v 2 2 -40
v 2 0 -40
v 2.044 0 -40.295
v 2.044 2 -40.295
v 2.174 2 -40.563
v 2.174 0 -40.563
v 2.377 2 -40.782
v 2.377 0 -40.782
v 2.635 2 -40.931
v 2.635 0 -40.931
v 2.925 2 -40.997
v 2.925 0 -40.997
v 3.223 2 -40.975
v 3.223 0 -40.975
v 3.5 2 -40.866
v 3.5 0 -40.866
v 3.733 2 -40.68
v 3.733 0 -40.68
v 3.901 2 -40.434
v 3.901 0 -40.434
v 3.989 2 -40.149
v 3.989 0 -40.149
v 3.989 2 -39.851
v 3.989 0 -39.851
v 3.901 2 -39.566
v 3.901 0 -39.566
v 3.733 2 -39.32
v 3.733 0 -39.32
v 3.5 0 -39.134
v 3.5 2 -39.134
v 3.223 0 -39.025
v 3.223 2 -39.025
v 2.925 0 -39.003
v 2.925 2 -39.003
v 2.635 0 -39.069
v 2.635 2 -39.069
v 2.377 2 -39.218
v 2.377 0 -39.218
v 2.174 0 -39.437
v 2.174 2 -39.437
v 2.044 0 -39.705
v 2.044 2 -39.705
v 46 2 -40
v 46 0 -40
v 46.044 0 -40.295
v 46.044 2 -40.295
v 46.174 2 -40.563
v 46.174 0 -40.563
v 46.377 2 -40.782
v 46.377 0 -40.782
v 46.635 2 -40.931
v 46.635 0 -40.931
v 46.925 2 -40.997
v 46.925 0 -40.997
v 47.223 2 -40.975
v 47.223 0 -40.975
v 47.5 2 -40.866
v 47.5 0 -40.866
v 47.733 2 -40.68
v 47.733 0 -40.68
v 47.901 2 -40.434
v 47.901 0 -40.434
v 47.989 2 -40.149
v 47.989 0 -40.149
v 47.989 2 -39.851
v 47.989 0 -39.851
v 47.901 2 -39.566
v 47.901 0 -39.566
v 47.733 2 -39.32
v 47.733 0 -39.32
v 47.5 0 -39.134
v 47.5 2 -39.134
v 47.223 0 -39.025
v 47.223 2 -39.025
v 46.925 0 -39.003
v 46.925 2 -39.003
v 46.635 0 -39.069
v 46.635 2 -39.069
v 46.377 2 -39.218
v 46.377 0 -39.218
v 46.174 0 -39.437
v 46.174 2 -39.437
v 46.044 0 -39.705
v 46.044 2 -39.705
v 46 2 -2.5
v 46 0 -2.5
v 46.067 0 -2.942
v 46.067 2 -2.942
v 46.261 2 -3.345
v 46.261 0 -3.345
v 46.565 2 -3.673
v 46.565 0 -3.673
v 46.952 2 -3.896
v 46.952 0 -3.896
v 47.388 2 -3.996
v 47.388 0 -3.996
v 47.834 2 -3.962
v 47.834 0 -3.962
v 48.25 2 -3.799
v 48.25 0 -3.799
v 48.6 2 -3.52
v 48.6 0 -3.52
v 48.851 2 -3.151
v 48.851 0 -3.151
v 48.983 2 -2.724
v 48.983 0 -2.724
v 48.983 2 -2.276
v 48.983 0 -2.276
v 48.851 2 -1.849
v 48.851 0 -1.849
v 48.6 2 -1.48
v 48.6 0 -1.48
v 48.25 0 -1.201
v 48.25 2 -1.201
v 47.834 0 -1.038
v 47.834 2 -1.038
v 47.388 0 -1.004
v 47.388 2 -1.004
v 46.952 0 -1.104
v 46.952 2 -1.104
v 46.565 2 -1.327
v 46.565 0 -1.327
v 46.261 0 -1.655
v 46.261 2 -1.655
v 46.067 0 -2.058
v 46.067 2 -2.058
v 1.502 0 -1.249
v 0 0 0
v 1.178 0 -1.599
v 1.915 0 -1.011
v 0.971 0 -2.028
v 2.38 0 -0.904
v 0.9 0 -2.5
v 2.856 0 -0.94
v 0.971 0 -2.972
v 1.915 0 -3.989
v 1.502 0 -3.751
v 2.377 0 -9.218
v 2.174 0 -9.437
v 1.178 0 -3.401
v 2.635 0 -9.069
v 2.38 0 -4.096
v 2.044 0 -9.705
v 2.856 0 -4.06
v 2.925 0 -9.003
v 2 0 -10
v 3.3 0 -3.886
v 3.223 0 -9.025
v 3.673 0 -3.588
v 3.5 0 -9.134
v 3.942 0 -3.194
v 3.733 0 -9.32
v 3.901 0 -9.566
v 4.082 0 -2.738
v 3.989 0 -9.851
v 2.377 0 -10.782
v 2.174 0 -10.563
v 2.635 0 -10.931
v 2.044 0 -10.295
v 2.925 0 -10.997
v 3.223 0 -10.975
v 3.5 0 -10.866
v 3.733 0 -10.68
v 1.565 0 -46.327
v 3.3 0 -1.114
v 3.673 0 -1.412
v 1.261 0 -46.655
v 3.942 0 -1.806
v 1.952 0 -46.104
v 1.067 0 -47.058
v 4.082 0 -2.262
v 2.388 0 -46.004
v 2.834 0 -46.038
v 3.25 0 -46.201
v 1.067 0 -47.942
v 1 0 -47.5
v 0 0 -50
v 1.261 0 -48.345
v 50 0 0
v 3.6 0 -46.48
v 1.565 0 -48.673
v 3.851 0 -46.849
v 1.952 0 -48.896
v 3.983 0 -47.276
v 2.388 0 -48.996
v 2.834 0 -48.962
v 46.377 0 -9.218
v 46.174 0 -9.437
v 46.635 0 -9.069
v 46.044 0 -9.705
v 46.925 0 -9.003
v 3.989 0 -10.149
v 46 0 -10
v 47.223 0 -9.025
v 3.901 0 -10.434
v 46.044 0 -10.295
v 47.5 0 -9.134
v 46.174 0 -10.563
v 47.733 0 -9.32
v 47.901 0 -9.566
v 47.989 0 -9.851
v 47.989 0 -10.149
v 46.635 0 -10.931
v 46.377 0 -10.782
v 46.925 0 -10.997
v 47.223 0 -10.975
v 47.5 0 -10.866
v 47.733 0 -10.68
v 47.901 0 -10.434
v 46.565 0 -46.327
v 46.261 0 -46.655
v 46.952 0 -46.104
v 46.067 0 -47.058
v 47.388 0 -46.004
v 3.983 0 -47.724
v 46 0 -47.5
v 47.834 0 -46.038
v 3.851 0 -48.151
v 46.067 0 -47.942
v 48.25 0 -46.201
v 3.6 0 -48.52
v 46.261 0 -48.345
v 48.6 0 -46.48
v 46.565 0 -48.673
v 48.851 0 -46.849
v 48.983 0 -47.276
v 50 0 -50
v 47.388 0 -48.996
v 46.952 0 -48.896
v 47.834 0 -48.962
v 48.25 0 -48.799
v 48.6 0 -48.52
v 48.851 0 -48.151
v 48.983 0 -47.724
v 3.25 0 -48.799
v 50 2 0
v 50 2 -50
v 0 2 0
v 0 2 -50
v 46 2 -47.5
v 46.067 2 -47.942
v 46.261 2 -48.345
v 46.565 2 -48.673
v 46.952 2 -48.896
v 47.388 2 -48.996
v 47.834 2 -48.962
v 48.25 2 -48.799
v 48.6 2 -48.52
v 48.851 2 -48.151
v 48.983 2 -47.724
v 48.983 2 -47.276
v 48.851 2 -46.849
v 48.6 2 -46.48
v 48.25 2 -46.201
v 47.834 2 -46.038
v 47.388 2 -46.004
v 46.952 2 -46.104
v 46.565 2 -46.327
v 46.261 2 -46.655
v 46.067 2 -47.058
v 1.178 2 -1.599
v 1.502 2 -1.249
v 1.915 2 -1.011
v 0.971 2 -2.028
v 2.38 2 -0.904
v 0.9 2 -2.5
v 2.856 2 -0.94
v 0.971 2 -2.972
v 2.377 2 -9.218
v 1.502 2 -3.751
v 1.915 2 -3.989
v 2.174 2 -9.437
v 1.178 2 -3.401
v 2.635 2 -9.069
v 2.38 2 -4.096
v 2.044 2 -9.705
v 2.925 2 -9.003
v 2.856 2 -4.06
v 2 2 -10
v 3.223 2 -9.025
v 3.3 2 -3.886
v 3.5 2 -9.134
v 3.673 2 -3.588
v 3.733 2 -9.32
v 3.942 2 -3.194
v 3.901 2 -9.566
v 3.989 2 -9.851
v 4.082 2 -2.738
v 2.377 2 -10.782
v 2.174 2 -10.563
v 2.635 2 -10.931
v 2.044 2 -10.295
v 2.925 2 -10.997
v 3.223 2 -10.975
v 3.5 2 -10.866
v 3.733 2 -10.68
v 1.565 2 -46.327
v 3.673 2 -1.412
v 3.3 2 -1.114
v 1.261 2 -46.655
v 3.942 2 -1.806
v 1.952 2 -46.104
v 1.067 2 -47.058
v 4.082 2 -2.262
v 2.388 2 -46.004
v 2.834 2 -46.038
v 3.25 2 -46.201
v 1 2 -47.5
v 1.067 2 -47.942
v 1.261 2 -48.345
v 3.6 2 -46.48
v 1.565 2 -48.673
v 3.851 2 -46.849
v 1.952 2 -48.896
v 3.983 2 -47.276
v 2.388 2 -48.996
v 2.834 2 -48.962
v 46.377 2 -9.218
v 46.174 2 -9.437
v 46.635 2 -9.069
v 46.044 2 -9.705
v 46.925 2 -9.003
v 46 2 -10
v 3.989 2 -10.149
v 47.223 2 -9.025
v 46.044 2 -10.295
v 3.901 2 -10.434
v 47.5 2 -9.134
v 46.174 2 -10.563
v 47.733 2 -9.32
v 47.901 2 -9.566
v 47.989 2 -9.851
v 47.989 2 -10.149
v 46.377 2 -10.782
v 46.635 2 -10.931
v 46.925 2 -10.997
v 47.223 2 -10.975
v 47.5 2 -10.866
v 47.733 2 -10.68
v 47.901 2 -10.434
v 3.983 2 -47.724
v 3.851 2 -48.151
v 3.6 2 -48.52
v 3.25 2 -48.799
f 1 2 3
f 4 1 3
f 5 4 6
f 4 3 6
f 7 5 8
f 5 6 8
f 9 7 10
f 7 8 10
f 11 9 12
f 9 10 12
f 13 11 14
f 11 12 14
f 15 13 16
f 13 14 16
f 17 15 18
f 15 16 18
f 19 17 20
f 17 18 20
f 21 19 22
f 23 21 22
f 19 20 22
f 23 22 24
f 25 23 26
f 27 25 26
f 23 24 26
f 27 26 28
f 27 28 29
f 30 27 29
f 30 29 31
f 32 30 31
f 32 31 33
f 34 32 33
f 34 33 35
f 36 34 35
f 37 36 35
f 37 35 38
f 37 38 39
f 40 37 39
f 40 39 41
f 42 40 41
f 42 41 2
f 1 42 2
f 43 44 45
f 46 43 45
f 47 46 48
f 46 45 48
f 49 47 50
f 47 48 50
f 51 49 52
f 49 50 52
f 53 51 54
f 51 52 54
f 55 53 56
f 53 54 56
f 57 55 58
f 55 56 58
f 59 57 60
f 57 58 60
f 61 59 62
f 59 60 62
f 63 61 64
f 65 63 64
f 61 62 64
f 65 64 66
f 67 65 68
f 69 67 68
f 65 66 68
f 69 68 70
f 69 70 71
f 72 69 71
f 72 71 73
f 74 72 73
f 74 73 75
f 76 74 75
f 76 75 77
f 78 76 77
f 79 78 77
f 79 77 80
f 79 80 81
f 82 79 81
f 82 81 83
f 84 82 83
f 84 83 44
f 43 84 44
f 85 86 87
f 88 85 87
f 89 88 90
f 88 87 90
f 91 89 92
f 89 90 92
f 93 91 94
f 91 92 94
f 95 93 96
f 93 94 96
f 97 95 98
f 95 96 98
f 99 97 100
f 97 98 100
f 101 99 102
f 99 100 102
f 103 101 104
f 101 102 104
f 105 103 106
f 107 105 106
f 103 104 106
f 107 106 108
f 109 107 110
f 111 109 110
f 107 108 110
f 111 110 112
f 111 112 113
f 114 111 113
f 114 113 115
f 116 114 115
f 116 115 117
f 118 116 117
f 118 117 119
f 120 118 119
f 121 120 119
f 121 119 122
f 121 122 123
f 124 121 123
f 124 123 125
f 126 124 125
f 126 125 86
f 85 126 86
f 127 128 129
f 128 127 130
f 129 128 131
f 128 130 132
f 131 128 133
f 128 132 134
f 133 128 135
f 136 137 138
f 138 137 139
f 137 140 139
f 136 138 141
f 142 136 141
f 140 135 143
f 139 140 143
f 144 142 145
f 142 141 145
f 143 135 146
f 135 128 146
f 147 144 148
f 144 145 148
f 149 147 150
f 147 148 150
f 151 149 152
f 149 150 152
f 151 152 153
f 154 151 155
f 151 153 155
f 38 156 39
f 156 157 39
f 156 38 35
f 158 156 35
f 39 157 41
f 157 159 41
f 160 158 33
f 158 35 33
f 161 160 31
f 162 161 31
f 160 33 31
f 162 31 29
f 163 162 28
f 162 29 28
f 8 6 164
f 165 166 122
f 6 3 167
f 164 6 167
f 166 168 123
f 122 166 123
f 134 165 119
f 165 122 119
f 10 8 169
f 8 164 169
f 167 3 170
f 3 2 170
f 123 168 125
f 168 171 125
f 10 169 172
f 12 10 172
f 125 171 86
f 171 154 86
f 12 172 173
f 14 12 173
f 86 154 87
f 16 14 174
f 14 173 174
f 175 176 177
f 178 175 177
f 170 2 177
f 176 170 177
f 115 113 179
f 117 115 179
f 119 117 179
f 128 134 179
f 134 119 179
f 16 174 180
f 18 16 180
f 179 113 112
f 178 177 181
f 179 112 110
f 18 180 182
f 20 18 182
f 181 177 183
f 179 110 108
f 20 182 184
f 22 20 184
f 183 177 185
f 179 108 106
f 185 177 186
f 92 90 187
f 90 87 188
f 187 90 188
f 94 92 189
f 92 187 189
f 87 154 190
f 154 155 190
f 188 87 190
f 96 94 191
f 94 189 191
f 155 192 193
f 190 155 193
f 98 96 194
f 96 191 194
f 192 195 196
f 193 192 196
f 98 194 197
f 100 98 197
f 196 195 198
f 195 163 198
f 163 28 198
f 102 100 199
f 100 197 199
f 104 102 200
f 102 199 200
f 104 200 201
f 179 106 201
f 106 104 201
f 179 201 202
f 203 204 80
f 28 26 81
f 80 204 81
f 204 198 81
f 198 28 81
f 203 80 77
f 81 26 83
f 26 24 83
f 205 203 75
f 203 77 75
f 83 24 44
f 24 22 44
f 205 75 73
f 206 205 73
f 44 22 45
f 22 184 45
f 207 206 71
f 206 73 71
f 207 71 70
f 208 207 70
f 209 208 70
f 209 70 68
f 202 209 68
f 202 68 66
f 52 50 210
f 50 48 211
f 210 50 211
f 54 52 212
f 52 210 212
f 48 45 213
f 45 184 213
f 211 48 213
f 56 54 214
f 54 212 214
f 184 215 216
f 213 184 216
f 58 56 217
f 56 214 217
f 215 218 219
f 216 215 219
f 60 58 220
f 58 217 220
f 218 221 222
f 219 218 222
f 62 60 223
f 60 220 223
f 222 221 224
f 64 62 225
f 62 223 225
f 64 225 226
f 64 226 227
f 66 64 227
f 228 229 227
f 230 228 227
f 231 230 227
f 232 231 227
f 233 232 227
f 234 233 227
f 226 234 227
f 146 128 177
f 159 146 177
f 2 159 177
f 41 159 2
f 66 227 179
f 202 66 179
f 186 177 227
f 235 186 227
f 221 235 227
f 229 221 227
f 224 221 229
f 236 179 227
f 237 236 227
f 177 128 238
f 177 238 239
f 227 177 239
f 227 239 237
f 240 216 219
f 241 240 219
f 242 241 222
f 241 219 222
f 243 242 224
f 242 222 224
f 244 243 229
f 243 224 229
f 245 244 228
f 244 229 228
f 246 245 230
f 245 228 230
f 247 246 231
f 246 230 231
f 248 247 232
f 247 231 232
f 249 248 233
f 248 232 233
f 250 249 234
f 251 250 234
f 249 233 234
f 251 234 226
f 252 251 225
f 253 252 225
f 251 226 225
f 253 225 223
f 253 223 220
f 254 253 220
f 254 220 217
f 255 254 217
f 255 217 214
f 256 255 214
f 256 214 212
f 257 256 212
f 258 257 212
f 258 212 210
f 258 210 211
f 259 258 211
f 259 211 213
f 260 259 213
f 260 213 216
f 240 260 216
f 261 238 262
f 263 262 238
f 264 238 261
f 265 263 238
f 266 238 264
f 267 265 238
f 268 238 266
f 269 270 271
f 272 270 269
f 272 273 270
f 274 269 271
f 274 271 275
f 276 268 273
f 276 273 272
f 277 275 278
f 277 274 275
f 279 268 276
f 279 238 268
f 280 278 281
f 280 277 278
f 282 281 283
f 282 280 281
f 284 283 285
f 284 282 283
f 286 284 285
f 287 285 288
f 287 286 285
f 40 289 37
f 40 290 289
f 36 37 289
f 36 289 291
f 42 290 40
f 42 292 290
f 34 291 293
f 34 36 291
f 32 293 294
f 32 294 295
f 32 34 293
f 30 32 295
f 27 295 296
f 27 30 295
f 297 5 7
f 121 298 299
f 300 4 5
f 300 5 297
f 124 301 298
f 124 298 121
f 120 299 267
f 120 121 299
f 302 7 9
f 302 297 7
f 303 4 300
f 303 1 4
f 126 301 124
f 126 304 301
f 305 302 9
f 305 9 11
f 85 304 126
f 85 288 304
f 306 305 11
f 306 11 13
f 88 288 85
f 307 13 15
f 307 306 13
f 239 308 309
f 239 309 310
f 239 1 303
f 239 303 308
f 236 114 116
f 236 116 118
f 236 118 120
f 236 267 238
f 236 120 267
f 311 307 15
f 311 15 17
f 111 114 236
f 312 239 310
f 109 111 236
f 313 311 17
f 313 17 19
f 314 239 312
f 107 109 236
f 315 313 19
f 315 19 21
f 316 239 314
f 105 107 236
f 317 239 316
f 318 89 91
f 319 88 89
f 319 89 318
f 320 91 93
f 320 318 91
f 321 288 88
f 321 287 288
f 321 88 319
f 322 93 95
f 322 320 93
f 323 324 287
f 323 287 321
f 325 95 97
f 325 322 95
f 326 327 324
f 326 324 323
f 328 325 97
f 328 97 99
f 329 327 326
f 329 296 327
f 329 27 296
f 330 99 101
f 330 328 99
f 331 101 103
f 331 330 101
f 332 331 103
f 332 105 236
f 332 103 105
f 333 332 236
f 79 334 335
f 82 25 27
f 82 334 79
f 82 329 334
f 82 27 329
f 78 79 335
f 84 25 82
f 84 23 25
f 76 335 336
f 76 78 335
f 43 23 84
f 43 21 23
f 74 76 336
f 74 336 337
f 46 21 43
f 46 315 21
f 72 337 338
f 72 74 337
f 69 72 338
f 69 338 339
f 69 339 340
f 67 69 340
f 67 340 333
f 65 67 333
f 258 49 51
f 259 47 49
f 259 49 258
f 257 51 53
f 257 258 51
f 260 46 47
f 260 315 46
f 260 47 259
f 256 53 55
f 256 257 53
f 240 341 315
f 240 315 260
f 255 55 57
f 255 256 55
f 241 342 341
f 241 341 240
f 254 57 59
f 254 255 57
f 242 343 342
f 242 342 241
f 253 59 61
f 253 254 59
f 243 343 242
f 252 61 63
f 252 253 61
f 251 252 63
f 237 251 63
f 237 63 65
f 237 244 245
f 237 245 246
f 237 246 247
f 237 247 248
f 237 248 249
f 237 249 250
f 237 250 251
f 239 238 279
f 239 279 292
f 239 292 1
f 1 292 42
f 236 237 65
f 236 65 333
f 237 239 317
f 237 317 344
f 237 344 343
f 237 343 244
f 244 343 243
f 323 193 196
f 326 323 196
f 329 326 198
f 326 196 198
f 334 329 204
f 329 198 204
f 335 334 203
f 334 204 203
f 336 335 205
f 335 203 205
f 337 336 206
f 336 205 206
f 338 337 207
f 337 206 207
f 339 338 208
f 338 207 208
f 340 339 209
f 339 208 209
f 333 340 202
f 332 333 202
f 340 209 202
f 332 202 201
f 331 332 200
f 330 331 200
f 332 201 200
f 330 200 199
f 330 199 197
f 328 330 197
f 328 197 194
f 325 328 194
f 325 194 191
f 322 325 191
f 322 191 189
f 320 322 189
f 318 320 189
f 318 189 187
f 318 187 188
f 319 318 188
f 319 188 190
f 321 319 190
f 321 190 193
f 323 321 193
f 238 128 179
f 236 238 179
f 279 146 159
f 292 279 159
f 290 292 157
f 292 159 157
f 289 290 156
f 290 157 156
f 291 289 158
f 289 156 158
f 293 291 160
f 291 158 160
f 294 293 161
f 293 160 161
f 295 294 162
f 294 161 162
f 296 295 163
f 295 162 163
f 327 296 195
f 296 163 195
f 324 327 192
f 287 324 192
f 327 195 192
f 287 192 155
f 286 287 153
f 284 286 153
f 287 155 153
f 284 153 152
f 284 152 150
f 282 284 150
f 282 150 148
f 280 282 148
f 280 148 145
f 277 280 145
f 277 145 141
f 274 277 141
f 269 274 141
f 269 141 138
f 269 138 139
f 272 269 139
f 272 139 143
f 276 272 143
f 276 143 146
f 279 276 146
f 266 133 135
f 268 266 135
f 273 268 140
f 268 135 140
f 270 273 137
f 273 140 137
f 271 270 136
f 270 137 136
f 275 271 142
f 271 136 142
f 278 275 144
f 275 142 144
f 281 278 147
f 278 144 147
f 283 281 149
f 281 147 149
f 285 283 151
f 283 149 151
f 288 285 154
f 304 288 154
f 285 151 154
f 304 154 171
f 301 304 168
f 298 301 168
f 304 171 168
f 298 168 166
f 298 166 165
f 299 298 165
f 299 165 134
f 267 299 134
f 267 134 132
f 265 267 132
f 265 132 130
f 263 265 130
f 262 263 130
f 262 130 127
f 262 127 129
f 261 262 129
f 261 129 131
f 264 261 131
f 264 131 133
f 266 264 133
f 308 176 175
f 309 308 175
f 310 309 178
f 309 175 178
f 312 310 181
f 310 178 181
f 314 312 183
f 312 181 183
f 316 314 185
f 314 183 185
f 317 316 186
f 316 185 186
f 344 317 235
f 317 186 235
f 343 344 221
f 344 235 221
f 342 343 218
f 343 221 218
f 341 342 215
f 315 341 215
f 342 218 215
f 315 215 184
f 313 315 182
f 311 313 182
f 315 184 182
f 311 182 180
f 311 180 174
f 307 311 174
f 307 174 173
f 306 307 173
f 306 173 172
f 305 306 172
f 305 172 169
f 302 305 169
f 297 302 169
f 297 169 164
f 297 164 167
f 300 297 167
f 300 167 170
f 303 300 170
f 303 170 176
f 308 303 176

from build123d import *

# Parameters (mm, degrees)
SKETCH1_W                = 50
SKETCH1_H                = 50
BOSS_EXTRUDE1_DEPTH      = 2
M3_CLEARANCE_HOLE1_D     = 3.2
M3_CLEARANCE_HOLE2_D     = 3
M2_CLEARANCE_HOLE1_D     = 2
M2_CLEARANCE_HOLE1_DEPTH = 10
M2_CLEARANCE_HOLE1_TIP   = 0.600860619


with BuildPart() as part:
    # Sketch1 → Boss-Extrude1 (new body)
    with BuildSketch(Plane(origin=(0, 0, 0), x_dir=(1, 0, 0), z_dir=(0, 1, 0))):
        with Locations((25, 25)):
            Rectangle(SKETCH1_W, SKETCH1_H)
    extrude(amount=BOSS_EXTRUDE1_DEPTH)

    # M3 Clearance Hole1 (through all)
    with Locations(Plane(origin=(0, 2, 0), x_dir=(1, 0, 0), z_dir=(0, 1, 0))):
        with Locations((2.5, 2.5)):
            Hole(M3_CLEARANCE_HOLE1_D / 2)

    # M3 Clearance Hole2 (through all)
    with Locations(Plane(origin=(0, 2, 0), x_dir=(1, 0, 0), z_dir=(0, 1, 0))):
        with Locations((47.5, 2.5), (47.5, 47.5), (2.5, 47.5)):
            Hole(M3_CLEARANCE_HOLE2_D / 2)

    # M2 Clearance Hole1
    with Locations(Plane(origin=(0, 2, 0), x_dir=(1, 0, 0), z_dir=(0, 1, 0))):
        with Locations((3, 10), (3, 40), (47, 40), (47, 10)):
            Hole(M2_CLEARANCE_HOLE1_D / 2, depth=M2_CLEARANCE_HOLE1_DEPTH)
            with Locations((0, 0, -(M2_CLEARANCE_HOLE1_DEPTH + M2_CLEARANCE_HOLE1_TIP / 2))):  # 118° drill point
                Cone(0, M2_CLEARANCE_HOLE1_D / 2, M2_CLEARANCE_HOLE1_TIP, mode=Mode.SUBTRACT)


solid = part.part
